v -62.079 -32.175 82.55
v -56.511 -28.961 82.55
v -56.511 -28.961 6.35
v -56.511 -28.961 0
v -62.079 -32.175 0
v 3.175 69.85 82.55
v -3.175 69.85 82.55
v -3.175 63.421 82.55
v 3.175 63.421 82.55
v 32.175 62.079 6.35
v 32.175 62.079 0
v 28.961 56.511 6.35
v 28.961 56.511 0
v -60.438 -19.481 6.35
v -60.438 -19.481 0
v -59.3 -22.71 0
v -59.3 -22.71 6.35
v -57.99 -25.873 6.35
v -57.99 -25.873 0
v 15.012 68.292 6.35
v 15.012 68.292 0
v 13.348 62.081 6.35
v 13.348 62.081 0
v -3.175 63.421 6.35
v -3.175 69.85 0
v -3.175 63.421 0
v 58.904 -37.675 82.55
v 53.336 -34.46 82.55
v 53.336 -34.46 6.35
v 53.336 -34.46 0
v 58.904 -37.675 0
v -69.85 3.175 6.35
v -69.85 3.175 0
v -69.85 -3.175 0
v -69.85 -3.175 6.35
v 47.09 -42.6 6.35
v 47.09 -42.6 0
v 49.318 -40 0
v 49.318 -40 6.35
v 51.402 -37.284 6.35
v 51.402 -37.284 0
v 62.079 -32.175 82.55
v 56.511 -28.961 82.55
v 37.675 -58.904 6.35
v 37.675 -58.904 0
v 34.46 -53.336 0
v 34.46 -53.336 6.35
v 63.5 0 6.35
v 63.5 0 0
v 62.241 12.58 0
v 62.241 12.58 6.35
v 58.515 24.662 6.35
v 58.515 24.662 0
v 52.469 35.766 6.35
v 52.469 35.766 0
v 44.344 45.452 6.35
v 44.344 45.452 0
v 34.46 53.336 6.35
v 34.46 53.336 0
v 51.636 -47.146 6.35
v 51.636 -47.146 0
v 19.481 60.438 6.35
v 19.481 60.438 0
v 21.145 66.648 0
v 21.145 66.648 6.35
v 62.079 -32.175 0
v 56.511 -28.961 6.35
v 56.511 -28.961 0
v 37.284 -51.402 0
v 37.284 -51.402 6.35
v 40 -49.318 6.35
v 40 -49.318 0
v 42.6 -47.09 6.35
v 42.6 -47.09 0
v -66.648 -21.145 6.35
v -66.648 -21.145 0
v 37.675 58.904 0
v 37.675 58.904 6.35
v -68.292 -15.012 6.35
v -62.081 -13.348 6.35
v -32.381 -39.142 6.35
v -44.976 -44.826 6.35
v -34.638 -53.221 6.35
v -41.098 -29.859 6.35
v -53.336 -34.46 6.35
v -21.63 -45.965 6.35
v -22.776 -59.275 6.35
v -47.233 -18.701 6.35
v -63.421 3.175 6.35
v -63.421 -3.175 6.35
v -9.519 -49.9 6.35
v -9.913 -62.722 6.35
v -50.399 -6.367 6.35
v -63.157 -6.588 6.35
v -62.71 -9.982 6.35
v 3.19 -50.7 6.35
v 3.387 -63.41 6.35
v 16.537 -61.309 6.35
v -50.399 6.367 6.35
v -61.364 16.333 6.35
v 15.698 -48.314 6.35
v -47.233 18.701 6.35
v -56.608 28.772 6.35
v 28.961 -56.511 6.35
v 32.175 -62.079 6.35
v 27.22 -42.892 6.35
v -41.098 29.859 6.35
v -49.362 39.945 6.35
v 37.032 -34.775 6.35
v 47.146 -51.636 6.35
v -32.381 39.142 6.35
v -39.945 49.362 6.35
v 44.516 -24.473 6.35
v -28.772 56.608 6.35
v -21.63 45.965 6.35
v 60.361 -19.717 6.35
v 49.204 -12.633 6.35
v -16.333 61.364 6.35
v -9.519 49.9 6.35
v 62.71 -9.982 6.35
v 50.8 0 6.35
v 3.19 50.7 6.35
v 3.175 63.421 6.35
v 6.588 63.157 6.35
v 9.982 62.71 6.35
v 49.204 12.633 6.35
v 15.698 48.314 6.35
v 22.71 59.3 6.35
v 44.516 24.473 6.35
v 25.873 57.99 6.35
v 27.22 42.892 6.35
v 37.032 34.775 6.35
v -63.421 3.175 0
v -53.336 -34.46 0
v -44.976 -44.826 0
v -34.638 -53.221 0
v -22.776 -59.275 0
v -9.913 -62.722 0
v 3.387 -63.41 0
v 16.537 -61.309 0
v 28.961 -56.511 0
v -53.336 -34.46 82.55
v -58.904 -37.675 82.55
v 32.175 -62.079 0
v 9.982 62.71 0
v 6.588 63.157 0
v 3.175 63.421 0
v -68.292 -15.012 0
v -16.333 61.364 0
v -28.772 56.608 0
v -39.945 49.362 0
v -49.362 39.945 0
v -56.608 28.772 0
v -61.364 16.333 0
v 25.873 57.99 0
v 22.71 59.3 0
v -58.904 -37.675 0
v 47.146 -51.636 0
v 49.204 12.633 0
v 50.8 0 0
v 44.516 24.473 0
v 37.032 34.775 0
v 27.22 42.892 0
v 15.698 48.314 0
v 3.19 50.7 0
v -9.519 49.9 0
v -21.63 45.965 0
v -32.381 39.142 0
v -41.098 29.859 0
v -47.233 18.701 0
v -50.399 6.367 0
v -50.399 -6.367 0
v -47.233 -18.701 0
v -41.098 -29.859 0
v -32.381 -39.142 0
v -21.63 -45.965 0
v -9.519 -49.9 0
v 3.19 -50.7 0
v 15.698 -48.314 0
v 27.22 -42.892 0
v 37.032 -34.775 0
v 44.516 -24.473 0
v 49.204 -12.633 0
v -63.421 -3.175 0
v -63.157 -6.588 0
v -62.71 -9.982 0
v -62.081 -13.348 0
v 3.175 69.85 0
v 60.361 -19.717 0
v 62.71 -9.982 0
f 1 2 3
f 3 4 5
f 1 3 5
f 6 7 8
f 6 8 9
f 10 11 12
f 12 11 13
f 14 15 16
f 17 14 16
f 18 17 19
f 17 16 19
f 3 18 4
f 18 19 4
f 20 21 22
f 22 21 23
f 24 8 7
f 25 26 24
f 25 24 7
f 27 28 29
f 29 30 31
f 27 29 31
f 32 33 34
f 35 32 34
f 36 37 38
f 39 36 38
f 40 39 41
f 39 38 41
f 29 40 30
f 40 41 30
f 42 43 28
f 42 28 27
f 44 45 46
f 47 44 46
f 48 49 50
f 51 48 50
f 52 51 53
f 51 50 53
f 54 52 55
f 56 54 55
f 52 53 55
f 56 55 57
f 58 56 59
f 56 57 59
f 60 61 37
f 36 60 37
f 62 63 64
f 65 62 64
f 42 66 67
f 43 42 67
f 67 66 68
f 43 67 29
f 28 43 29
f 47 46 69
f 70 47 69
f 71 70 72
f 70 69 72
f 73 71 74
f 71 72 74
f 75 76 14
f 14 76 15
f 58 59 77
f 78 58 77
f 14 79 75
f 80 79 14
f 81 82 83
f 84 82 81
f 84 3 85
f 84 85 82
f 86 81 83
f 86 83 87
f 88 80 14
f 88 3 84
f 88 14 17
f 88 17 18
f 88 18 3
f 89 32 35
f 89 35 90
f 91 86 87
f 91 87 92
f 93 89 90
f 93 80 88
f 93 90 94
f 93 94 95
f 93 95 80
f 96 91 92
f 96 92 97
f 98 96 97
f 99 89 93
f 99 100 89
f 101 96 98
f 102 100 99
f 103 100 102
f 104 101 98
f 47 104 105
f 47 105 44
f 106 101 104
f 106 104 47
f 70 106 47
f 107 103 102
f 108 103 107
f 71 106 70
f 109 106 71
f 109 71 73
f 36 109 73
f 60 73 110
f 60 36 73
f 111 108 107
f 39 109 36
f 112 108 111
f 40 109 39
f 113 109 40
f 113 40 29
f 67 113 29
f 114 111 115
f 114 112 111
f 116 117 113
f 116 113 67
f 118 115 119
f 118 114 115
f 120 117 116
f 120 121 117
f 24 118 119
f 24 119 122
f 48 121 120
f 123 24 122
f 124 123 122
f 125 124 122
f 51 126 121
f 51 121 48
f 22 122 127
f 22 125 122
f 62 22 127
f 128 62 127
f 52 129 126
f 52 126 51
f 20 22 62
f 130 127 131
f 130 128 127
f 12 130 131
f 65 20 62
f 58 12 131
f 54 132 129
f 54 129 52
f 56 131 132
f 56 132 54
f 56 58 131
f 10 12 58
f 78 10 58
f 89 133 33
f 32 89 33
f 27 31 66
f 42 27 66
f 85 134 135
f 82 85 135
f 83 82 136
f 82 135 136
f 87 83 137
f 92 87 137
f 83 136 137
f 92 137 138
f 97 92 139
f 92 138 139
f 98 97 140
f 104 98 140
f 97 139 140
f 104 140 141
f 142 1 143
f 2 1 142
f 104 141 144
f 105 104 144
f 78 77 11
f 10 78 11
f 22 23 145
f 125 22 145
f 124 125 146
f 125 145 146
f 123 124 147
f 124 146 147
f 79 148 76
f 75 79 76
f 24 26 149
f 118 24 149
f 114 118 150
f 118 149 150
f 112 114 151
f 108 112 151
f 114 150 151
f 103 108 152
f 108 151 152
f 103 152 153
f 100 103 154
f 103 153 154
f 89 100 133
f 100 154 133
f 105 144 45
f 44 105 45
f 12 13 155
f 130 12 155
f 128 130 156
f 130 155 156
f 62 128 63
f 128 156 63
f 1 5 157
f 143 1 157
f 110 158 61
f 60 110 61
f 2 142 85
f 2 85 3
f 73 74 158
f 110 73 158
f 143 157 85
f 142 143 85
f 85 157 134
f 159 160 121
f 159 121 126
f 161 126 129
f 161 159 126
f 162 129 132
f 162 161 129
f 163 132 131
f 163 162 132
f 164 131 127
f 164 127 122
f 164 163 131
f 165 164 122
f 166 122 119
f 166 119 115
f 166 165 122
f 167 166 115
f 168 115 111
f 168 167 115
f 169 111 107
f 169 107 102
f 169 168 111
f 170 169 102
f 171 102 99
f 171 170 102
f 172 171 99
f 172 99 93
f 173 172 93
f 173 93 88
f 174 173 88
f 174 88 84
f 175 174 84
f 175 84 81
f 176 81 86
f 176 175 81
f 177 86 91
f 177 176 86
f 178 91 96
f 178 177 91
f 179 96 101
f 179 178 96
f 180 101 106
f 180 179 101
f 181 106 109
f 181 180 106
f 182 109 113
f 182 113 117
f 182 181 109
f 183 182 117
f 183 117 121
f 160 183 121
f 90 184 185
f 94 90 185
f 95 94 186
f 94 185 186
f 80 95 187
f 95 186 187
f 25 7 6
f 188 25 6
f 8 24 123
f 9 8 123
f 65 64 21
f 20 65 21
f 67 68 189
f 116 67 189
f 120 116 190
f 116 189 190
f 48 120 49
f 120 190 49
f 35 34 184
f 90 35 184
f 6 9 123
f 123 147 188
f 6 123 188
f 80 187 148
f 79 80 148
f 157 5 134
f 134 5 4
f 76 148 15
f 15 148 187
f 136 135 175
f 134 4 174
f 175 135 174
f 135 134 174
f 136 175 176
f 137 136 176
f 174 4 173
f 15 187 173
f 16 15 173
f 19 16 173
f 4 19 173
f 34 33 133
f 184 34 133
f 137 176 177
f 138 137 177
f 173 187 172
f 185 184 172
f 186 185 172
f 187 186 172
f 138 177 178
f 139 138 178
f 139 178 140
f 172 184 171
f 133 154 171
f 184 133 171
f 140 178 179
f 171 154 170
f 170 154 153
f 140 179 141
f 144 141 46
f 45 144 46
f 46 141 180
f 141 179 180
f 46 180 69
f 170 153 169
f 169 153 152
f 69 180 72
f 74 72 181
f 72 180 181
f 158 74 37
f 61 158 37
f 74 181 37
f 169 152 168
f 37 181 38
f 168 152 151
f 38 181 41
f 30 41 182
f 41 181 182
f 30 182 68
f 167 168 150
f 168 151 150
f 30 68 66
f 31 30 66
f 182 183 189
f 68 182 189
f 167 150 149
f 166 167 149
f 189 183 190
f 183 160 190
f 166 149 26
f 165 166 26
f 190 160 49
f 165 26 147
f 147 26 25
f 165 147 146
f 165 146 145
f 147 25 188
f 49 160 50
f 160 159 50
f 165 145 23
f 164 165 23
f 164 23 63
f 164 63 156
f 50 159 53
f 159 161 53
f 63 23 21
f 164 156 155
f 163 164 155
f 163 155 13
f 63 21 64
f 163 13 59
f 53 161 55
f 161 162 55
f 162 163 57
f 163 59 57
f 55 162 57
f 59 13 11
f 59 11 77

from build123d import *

# Parameters (mm, degrees)
F0_R     = 50.8
F1_DEPTH = 6.35
F2_W     = 6.35
F2_H     = 6.4294246715
F3_DEPTH = 76.2


# Not quite as in the source:
# - a feature names something its author has since deleted; it is built from what else it names


with BuildPart() as f1:
    # F0 (on Top) → F1 (new body)
    with BuildSketch(Plane.XY):
        with BuildLine():
            ThreePointArc((56.5113293571, -28.9606570072), (61.7281111576, -14.895982442), (63.5, 0))
            ThreePointArc((63.5, 0), (55.7694128237, 30.3648249344), (34.4599183213, 53.3363293571))
            Line((34.4599183213, 53.3363293571), (31.324630657, 47.9058518263))
            Line((31.324630657, 47.9058518263), (25.825369343, 51.0808518263))
            Line((25.825369343, 51.0808518263), (28.9606570072, 56.5113293571))
            ThreePointArc((28.9606570072, 56.5113293571), (24.3003979552, 58.6663503145), (19.4812672448, 60.4378211597))
            Line((19.4812672448, 60.4378211597), (17.8583229261, 54.3809105042))
            Line((17.8583229261, 54.3809105042), (11.7246939291, 56.0244114406))
            Line((11.7246939291, 56.0244114406), (13.3476382479, 62.0813220961))
            ThreePointArc((13.3476382479, 62.0813220961), (8.288413206, 62.9567486972), (3.175, 63.4205753285))
            Line((3.175, 63.4205753285), (3.175, 57.15))
            Line((3.175, 57.15), (-3.175, 57.15))
            Line((-3.175, 57.15), (-3.175, 63.4205753285))
            ThreePointArc((-3.175, 63.4205753285), (-44.9012806053, 44.9012806053), (-63.4205753285, 3.175))
            Line((-63.4205753285, 3.175), (-57.15, 3.175))
            Line((-57.15, 3.175), (-57.15, -3.175))
            Line((-57.15, -3.175), (-63.4205753285, -3.175))
            ThreePointArc((-63.4205753285, -3.175), (-62.9567486972, -8.288413206), (-62.0813220961, -13.3476382479))
            Line((-62.0813220961, -13.3476382479), (-56.0244114406, -11.7246939291))
            Line((-56.0244114406, -11.7246939291), (-54.3809105042, -17.8583229261))
            Line((-54.3809105042, -17.8583229261), (-60.4378211597, -19.4812672448))
            ThreePointArc((-60.4378211597, -19.4812672448), (-58.6663503145, -24.3003979552), (-56.5113293571, -28.9606570072))
            Line((-56.5113293571, -28.9606570072), (-51.0808518263, -25.825369343))
            Line((-51.0808518263, -25.825369343), (-47.9058518263, -31.324630657))
            Line((-47.9058518263, -31.324630657), (-53.3363293571, -34.4599183213))
            ThreePointArc((-53.3363293571, -34.4599183213), (-16.435009364, -61.3362899694), (28.9606570072, -56.5113293571))
            Line((28.9606570072, -56.5113293571), (25.825369343, -51.0808518263))
            Line((25.825369343, -51.0808518263), (31.324630657, -47.9058518263))
            Line((31.324630657, -47.9058518263), (34.4599183213, -53.3363293571))
            ThreePointArc((34.4599183213, -53.3363293571), (38.6563507421, -50.3779371085), (42.6000548513, -47.0901829118))
            Line((42.6000548513, -47.0901829118), (38.1660885145, -42.6562165751))
            Line((38.1660885145, -42.6562165751), (42.6562165751, -38.1660885145))
            Line((42.6562165751, -38.1660885145), (47.0901829118, -42.6000548513))
            ThreePointArc((47.0901829118, -42.6000548513), (50.3779371085, -38.6563507421), (53.3363293571, -34.4599183213))
            Line((53.3363293571, -34.4599183213), (47.9058518263, -31.324630657))
            Line((47.9058518263, -31.324630657), (51.0808518263, -25.825369343))
            Line((51.0808518263, -25.825369343), (56.5113293571, -28.9606570072))
        make_face()
        Circle(F0_R, mode=Mode.SUBTRACT)
        with BuildLine():
            ThreePointArc((-3.175, 63.4205753285), (0, 63.5), (3.175, 63.4205753285))
            Line((3.175, 63.4205753285), (3.175, 69.85))
            Line((3.175, 69.85), (-3.175, 69.85))
            Line((-3.175, 69.85), (-3.175, 63.4205753285))
        make_face()
        with BuildLine():
            Line((3.175, 57.15), (3.175, 63.4205753285))
            ThreePointArc((3.175, 63.4205753285), (0, 63.5), (-3.175, 63.4205753285))
            Line((-3.175, 63.4205753285), (-3.175, 57.15))
            Line((-3.175, 57.15), (3.175, 57.15))
        make_face()
        with BuildLine():
            Line((17.8583229261, 54.3809105042), (19.4812672448, 60.4378211597))
            ThreePointArc((19.4812672448, 60.4378211597), (16.435009364, 61.3362899694), (13.3476382479, 62.0813220961))
            Line((13.3476382479, 62.0813220961), (11.7246939291, 56.0244114406))
            Line((11.7246939291, 56.0244114406), (17.8583229261, 54.3809105042))
        make_face()
        with BuildLine():
            ThreePointArc((13.3476382479, 62.0813220961), (16.435009364, 61.3362899694), (19.4812672448, 60.4378211597))
            Line((19.4812672448, 60.4378211597), (21.1453247989, 66.6481684981))
            Line((21.1453247989, 66.6481684981), (15.0116958019, 68.2916694345))
            Line((15.0116958019, 68.2916694345), (13.3476382479, 62.0813220961))
        make_face()
        with BuildLine():
            ThreePointArc((28.9606570072, 56.5113293571), (31.75, 54.9926131403), (34.4599183213, 53.3363293571))
            Line((34.4599183213, 53.3363293571), (37.674630657, 58.9043744543))
            Line((37.674630657, 58.9043744543), (32.175369343, 62.0793744543))
            Line((32.175369343, 62.0793744543), (28.9606570072, 56.5113293571))
        make_face()
        with BuildLine():
            Line((31.324630657, 47.9058518263), (34.4599183213, 53.3363293571))
            ThreePointArc((34.4599183213, 53.3363293571), (31.75, 54.9926131403), (28.9606570072, 56.5113293571))
            Line((28.9606570072, 56.5113293571), (25.825369343, 51.0808518263))
            Line((25.825369343, 51.0808518263), (31.324630657, 47.9058518263))
        make_face()
        with BuildLine():
            Line((62.0793744543, -32.175369343), (56.5113293571, -28.9606570072))
            ThreePointArc((56.5113293571, -28.9606570072), (54.9926131403, -31.75), (53.3363293571, -34.4599183213))
            Line((53.3363293571, -34.4599183213), (58.9043744543, -37.674630657))
            Line((58.9043744543, -37.674630657), (62.0793744543, -32.175369343))
        make_face()
        with BuildLine():
            ThreePointArc((53.3363293571, -34.4599183213), (54.9926131403, -31.75), (56.5113293571, -28.9606570072))
            Line((56.5113293571, -28.9606570072), (51.0808518263, -25.825369343))
            Line((51.0808518263, -25.825369343), (47.9058518263, -31.324630657))
            Line((47.9058518263, -31.324630657), (53.3363293571, -34.4599183213))
        make_face()
        with BuildLine():
            Line((51.6364726961, -47.1463446356), (47.0901829118, -42.6000548513))
            ThreePointArc((47.0901829118, -42.6000548513), (44.9012806053, -44.9012806053), (42.6000548513, -47.0901829118))
            Line((42.6000548513, -47.0901829118), (47.1463446356, -51.6364726961))
            Line((47.1463446356, -51.6364726961), (51.6364726961, -47.1463446356))
        make_face()
        with BuildLine():
            ThreePointArc((42.6000548513, -47.0901829118), (44.9012806053, -44.9012806053), (47.0901829118, -42.6000548513))
            Line((47.0901829118, -42.6000548513), (42.6562165751, -38.1660885145))
            Line((42.6562165751, -38.1660885145), (38.1660885145, -42.6562165751))
            Line((38.1660885145, -42.6562165751), (42.6000548513, -47.0901829118))
        make_face()
        with BuildLine():
            ThreePointArc((28.9606570072, -56.5113293571), (31.75, -54.9926131403), (34.4599183213, -53.3363293571))
            Line((34.4599183213, -53.3363293571), (31.324630657, -47.9058518263))
            Line((31.324630657, -47.9058518263), (25.825369343, -51.0808518263))
            Line((25.825369343, -51.0808518263), (28.9606570072, -56.5113293571))
        make_face()
        with BuildLine():
            Line((37.674630657, -58.9043744543), (34.4599183213, -53.3363293571))
            ThreePointArc((34.4599183213, -53.3363293571), (31.75, -54.9926131403), (28.9606570072, -56.5113293571))
            Line((28.9606570072, -56.5113293571), (32.175369343, -62.0793744543))
            Line((32.175369343, -62.0793744543), (37.674630657, -58.9043744543))
        make_face()
        with BuildLine():
            Line((-58.9043744543, -37.674630657), (-53.3363293571, -34.4599183213))
            ThreePointArc((-53.3363293571, -34.4599183213), (-54.9926131403, -31.75), (-56.5113293571, -28.9606570072))
            Line((-56.5113293571, -28.9606570072), (-62.0793744543, -32.175369343))
            Line((-62.0793744543, -32.175369343), (-58.9043744543, -37.674630657))
        make_face()
        with BuildLine():
            ThreePointArc((-60.4378211597, -19.4812672448), (-61.3362899694, -16.435009364), (-62.0813220961, -13.3476382479))
            Line((-62.0813220961, -13.3476382479), (-68.2916694345, -15.0116958019))
            Line((-68.2916694345, -15.0116958019), (-66.6481684981, -21.1453247989))
            Line((-66.6481684981, -21.1453247989), (-60.4378211597, -19.4812672448))
        make_face()
        with BuildLine():
            ThreePointArc((-63.4205753285, -3.175), (-63.5, 0), (-63.4205753285, 3.175))
            Line((-63.4205753285, 3.175), (-69.85, 3.175))
            Line((-69.85, 3.175), (-69.85, -3.175))
            Line((-69.85, -3.175), (-63.4205753285, -3.175))
        make_face()
        with BuildLine():
            Line((-57.15, 3.175), (-63.4205753285, 3.175))
            ThreePointArc((-63.4205753285, 3.175), (-63.5, 0), (-63.4205753285, -3.175))
            Line((-63.4205753285, -3.175), (-57.15, -3.175))
            Line((-57.15, -3.175), (-57.15, 3.175))
        make_face()
        with BuildLine():
            Line((-56.0244114406, -11.7246939291), (-62.0813220961, -13.3476382479))
            ThreePointArc((-62.0813220961, -13.3476382479), (-61.3362899694, -16.435009364), (-60.4378211597, -19.4812672448))
            Line((-60.4378211597, -19.4812672448), (-54.3809105042, -17.8583229261))
            Line((-54.3809105042, -17.8583229261), (-56.0244114406, -11.7246939291))
        make_face()
        with BuildLine():
            ThreePointArc((-56.5113293571, -28.9606570072), (-54.9926131403, -31.75), (-53.3363293571, -34.4599183213))
            Line((-53.3363293571, -34.4599183213), (-47.9058518263, -31.324630657))
            Line((-47.9058518263, -31.324630657), (-51.0808518263, -25.825369343))
            Line((-51.0808518263, -25.825369343), (-56.5113293571, -28.9606570072))
        make_face()
    extrude(amount=F1_DEPTH)

    # F2 (on face) → F3 (join)
    with BuildSketch(Plane.XY.offset(6.35)):
        with Locations((0, 66.6352876643)):
            Rectangle(F2_W, F2_H)
        Polygon((62.0793744543, -32.175369343), (56.5113293571, -28.9606570072), (53.3363293571, -34.4599183213), (58.9043744543, -37.674630657), align=None)
        Polygon((-53.3363293571, -34.4599183213), (-56.5113293571, -28.9606570072), (-62.0793744543, -32.175369343), (-58.9043744543, -37.674630657), align=None)
    extrude(amount=F3_DEPTH)


solid = f1.part
